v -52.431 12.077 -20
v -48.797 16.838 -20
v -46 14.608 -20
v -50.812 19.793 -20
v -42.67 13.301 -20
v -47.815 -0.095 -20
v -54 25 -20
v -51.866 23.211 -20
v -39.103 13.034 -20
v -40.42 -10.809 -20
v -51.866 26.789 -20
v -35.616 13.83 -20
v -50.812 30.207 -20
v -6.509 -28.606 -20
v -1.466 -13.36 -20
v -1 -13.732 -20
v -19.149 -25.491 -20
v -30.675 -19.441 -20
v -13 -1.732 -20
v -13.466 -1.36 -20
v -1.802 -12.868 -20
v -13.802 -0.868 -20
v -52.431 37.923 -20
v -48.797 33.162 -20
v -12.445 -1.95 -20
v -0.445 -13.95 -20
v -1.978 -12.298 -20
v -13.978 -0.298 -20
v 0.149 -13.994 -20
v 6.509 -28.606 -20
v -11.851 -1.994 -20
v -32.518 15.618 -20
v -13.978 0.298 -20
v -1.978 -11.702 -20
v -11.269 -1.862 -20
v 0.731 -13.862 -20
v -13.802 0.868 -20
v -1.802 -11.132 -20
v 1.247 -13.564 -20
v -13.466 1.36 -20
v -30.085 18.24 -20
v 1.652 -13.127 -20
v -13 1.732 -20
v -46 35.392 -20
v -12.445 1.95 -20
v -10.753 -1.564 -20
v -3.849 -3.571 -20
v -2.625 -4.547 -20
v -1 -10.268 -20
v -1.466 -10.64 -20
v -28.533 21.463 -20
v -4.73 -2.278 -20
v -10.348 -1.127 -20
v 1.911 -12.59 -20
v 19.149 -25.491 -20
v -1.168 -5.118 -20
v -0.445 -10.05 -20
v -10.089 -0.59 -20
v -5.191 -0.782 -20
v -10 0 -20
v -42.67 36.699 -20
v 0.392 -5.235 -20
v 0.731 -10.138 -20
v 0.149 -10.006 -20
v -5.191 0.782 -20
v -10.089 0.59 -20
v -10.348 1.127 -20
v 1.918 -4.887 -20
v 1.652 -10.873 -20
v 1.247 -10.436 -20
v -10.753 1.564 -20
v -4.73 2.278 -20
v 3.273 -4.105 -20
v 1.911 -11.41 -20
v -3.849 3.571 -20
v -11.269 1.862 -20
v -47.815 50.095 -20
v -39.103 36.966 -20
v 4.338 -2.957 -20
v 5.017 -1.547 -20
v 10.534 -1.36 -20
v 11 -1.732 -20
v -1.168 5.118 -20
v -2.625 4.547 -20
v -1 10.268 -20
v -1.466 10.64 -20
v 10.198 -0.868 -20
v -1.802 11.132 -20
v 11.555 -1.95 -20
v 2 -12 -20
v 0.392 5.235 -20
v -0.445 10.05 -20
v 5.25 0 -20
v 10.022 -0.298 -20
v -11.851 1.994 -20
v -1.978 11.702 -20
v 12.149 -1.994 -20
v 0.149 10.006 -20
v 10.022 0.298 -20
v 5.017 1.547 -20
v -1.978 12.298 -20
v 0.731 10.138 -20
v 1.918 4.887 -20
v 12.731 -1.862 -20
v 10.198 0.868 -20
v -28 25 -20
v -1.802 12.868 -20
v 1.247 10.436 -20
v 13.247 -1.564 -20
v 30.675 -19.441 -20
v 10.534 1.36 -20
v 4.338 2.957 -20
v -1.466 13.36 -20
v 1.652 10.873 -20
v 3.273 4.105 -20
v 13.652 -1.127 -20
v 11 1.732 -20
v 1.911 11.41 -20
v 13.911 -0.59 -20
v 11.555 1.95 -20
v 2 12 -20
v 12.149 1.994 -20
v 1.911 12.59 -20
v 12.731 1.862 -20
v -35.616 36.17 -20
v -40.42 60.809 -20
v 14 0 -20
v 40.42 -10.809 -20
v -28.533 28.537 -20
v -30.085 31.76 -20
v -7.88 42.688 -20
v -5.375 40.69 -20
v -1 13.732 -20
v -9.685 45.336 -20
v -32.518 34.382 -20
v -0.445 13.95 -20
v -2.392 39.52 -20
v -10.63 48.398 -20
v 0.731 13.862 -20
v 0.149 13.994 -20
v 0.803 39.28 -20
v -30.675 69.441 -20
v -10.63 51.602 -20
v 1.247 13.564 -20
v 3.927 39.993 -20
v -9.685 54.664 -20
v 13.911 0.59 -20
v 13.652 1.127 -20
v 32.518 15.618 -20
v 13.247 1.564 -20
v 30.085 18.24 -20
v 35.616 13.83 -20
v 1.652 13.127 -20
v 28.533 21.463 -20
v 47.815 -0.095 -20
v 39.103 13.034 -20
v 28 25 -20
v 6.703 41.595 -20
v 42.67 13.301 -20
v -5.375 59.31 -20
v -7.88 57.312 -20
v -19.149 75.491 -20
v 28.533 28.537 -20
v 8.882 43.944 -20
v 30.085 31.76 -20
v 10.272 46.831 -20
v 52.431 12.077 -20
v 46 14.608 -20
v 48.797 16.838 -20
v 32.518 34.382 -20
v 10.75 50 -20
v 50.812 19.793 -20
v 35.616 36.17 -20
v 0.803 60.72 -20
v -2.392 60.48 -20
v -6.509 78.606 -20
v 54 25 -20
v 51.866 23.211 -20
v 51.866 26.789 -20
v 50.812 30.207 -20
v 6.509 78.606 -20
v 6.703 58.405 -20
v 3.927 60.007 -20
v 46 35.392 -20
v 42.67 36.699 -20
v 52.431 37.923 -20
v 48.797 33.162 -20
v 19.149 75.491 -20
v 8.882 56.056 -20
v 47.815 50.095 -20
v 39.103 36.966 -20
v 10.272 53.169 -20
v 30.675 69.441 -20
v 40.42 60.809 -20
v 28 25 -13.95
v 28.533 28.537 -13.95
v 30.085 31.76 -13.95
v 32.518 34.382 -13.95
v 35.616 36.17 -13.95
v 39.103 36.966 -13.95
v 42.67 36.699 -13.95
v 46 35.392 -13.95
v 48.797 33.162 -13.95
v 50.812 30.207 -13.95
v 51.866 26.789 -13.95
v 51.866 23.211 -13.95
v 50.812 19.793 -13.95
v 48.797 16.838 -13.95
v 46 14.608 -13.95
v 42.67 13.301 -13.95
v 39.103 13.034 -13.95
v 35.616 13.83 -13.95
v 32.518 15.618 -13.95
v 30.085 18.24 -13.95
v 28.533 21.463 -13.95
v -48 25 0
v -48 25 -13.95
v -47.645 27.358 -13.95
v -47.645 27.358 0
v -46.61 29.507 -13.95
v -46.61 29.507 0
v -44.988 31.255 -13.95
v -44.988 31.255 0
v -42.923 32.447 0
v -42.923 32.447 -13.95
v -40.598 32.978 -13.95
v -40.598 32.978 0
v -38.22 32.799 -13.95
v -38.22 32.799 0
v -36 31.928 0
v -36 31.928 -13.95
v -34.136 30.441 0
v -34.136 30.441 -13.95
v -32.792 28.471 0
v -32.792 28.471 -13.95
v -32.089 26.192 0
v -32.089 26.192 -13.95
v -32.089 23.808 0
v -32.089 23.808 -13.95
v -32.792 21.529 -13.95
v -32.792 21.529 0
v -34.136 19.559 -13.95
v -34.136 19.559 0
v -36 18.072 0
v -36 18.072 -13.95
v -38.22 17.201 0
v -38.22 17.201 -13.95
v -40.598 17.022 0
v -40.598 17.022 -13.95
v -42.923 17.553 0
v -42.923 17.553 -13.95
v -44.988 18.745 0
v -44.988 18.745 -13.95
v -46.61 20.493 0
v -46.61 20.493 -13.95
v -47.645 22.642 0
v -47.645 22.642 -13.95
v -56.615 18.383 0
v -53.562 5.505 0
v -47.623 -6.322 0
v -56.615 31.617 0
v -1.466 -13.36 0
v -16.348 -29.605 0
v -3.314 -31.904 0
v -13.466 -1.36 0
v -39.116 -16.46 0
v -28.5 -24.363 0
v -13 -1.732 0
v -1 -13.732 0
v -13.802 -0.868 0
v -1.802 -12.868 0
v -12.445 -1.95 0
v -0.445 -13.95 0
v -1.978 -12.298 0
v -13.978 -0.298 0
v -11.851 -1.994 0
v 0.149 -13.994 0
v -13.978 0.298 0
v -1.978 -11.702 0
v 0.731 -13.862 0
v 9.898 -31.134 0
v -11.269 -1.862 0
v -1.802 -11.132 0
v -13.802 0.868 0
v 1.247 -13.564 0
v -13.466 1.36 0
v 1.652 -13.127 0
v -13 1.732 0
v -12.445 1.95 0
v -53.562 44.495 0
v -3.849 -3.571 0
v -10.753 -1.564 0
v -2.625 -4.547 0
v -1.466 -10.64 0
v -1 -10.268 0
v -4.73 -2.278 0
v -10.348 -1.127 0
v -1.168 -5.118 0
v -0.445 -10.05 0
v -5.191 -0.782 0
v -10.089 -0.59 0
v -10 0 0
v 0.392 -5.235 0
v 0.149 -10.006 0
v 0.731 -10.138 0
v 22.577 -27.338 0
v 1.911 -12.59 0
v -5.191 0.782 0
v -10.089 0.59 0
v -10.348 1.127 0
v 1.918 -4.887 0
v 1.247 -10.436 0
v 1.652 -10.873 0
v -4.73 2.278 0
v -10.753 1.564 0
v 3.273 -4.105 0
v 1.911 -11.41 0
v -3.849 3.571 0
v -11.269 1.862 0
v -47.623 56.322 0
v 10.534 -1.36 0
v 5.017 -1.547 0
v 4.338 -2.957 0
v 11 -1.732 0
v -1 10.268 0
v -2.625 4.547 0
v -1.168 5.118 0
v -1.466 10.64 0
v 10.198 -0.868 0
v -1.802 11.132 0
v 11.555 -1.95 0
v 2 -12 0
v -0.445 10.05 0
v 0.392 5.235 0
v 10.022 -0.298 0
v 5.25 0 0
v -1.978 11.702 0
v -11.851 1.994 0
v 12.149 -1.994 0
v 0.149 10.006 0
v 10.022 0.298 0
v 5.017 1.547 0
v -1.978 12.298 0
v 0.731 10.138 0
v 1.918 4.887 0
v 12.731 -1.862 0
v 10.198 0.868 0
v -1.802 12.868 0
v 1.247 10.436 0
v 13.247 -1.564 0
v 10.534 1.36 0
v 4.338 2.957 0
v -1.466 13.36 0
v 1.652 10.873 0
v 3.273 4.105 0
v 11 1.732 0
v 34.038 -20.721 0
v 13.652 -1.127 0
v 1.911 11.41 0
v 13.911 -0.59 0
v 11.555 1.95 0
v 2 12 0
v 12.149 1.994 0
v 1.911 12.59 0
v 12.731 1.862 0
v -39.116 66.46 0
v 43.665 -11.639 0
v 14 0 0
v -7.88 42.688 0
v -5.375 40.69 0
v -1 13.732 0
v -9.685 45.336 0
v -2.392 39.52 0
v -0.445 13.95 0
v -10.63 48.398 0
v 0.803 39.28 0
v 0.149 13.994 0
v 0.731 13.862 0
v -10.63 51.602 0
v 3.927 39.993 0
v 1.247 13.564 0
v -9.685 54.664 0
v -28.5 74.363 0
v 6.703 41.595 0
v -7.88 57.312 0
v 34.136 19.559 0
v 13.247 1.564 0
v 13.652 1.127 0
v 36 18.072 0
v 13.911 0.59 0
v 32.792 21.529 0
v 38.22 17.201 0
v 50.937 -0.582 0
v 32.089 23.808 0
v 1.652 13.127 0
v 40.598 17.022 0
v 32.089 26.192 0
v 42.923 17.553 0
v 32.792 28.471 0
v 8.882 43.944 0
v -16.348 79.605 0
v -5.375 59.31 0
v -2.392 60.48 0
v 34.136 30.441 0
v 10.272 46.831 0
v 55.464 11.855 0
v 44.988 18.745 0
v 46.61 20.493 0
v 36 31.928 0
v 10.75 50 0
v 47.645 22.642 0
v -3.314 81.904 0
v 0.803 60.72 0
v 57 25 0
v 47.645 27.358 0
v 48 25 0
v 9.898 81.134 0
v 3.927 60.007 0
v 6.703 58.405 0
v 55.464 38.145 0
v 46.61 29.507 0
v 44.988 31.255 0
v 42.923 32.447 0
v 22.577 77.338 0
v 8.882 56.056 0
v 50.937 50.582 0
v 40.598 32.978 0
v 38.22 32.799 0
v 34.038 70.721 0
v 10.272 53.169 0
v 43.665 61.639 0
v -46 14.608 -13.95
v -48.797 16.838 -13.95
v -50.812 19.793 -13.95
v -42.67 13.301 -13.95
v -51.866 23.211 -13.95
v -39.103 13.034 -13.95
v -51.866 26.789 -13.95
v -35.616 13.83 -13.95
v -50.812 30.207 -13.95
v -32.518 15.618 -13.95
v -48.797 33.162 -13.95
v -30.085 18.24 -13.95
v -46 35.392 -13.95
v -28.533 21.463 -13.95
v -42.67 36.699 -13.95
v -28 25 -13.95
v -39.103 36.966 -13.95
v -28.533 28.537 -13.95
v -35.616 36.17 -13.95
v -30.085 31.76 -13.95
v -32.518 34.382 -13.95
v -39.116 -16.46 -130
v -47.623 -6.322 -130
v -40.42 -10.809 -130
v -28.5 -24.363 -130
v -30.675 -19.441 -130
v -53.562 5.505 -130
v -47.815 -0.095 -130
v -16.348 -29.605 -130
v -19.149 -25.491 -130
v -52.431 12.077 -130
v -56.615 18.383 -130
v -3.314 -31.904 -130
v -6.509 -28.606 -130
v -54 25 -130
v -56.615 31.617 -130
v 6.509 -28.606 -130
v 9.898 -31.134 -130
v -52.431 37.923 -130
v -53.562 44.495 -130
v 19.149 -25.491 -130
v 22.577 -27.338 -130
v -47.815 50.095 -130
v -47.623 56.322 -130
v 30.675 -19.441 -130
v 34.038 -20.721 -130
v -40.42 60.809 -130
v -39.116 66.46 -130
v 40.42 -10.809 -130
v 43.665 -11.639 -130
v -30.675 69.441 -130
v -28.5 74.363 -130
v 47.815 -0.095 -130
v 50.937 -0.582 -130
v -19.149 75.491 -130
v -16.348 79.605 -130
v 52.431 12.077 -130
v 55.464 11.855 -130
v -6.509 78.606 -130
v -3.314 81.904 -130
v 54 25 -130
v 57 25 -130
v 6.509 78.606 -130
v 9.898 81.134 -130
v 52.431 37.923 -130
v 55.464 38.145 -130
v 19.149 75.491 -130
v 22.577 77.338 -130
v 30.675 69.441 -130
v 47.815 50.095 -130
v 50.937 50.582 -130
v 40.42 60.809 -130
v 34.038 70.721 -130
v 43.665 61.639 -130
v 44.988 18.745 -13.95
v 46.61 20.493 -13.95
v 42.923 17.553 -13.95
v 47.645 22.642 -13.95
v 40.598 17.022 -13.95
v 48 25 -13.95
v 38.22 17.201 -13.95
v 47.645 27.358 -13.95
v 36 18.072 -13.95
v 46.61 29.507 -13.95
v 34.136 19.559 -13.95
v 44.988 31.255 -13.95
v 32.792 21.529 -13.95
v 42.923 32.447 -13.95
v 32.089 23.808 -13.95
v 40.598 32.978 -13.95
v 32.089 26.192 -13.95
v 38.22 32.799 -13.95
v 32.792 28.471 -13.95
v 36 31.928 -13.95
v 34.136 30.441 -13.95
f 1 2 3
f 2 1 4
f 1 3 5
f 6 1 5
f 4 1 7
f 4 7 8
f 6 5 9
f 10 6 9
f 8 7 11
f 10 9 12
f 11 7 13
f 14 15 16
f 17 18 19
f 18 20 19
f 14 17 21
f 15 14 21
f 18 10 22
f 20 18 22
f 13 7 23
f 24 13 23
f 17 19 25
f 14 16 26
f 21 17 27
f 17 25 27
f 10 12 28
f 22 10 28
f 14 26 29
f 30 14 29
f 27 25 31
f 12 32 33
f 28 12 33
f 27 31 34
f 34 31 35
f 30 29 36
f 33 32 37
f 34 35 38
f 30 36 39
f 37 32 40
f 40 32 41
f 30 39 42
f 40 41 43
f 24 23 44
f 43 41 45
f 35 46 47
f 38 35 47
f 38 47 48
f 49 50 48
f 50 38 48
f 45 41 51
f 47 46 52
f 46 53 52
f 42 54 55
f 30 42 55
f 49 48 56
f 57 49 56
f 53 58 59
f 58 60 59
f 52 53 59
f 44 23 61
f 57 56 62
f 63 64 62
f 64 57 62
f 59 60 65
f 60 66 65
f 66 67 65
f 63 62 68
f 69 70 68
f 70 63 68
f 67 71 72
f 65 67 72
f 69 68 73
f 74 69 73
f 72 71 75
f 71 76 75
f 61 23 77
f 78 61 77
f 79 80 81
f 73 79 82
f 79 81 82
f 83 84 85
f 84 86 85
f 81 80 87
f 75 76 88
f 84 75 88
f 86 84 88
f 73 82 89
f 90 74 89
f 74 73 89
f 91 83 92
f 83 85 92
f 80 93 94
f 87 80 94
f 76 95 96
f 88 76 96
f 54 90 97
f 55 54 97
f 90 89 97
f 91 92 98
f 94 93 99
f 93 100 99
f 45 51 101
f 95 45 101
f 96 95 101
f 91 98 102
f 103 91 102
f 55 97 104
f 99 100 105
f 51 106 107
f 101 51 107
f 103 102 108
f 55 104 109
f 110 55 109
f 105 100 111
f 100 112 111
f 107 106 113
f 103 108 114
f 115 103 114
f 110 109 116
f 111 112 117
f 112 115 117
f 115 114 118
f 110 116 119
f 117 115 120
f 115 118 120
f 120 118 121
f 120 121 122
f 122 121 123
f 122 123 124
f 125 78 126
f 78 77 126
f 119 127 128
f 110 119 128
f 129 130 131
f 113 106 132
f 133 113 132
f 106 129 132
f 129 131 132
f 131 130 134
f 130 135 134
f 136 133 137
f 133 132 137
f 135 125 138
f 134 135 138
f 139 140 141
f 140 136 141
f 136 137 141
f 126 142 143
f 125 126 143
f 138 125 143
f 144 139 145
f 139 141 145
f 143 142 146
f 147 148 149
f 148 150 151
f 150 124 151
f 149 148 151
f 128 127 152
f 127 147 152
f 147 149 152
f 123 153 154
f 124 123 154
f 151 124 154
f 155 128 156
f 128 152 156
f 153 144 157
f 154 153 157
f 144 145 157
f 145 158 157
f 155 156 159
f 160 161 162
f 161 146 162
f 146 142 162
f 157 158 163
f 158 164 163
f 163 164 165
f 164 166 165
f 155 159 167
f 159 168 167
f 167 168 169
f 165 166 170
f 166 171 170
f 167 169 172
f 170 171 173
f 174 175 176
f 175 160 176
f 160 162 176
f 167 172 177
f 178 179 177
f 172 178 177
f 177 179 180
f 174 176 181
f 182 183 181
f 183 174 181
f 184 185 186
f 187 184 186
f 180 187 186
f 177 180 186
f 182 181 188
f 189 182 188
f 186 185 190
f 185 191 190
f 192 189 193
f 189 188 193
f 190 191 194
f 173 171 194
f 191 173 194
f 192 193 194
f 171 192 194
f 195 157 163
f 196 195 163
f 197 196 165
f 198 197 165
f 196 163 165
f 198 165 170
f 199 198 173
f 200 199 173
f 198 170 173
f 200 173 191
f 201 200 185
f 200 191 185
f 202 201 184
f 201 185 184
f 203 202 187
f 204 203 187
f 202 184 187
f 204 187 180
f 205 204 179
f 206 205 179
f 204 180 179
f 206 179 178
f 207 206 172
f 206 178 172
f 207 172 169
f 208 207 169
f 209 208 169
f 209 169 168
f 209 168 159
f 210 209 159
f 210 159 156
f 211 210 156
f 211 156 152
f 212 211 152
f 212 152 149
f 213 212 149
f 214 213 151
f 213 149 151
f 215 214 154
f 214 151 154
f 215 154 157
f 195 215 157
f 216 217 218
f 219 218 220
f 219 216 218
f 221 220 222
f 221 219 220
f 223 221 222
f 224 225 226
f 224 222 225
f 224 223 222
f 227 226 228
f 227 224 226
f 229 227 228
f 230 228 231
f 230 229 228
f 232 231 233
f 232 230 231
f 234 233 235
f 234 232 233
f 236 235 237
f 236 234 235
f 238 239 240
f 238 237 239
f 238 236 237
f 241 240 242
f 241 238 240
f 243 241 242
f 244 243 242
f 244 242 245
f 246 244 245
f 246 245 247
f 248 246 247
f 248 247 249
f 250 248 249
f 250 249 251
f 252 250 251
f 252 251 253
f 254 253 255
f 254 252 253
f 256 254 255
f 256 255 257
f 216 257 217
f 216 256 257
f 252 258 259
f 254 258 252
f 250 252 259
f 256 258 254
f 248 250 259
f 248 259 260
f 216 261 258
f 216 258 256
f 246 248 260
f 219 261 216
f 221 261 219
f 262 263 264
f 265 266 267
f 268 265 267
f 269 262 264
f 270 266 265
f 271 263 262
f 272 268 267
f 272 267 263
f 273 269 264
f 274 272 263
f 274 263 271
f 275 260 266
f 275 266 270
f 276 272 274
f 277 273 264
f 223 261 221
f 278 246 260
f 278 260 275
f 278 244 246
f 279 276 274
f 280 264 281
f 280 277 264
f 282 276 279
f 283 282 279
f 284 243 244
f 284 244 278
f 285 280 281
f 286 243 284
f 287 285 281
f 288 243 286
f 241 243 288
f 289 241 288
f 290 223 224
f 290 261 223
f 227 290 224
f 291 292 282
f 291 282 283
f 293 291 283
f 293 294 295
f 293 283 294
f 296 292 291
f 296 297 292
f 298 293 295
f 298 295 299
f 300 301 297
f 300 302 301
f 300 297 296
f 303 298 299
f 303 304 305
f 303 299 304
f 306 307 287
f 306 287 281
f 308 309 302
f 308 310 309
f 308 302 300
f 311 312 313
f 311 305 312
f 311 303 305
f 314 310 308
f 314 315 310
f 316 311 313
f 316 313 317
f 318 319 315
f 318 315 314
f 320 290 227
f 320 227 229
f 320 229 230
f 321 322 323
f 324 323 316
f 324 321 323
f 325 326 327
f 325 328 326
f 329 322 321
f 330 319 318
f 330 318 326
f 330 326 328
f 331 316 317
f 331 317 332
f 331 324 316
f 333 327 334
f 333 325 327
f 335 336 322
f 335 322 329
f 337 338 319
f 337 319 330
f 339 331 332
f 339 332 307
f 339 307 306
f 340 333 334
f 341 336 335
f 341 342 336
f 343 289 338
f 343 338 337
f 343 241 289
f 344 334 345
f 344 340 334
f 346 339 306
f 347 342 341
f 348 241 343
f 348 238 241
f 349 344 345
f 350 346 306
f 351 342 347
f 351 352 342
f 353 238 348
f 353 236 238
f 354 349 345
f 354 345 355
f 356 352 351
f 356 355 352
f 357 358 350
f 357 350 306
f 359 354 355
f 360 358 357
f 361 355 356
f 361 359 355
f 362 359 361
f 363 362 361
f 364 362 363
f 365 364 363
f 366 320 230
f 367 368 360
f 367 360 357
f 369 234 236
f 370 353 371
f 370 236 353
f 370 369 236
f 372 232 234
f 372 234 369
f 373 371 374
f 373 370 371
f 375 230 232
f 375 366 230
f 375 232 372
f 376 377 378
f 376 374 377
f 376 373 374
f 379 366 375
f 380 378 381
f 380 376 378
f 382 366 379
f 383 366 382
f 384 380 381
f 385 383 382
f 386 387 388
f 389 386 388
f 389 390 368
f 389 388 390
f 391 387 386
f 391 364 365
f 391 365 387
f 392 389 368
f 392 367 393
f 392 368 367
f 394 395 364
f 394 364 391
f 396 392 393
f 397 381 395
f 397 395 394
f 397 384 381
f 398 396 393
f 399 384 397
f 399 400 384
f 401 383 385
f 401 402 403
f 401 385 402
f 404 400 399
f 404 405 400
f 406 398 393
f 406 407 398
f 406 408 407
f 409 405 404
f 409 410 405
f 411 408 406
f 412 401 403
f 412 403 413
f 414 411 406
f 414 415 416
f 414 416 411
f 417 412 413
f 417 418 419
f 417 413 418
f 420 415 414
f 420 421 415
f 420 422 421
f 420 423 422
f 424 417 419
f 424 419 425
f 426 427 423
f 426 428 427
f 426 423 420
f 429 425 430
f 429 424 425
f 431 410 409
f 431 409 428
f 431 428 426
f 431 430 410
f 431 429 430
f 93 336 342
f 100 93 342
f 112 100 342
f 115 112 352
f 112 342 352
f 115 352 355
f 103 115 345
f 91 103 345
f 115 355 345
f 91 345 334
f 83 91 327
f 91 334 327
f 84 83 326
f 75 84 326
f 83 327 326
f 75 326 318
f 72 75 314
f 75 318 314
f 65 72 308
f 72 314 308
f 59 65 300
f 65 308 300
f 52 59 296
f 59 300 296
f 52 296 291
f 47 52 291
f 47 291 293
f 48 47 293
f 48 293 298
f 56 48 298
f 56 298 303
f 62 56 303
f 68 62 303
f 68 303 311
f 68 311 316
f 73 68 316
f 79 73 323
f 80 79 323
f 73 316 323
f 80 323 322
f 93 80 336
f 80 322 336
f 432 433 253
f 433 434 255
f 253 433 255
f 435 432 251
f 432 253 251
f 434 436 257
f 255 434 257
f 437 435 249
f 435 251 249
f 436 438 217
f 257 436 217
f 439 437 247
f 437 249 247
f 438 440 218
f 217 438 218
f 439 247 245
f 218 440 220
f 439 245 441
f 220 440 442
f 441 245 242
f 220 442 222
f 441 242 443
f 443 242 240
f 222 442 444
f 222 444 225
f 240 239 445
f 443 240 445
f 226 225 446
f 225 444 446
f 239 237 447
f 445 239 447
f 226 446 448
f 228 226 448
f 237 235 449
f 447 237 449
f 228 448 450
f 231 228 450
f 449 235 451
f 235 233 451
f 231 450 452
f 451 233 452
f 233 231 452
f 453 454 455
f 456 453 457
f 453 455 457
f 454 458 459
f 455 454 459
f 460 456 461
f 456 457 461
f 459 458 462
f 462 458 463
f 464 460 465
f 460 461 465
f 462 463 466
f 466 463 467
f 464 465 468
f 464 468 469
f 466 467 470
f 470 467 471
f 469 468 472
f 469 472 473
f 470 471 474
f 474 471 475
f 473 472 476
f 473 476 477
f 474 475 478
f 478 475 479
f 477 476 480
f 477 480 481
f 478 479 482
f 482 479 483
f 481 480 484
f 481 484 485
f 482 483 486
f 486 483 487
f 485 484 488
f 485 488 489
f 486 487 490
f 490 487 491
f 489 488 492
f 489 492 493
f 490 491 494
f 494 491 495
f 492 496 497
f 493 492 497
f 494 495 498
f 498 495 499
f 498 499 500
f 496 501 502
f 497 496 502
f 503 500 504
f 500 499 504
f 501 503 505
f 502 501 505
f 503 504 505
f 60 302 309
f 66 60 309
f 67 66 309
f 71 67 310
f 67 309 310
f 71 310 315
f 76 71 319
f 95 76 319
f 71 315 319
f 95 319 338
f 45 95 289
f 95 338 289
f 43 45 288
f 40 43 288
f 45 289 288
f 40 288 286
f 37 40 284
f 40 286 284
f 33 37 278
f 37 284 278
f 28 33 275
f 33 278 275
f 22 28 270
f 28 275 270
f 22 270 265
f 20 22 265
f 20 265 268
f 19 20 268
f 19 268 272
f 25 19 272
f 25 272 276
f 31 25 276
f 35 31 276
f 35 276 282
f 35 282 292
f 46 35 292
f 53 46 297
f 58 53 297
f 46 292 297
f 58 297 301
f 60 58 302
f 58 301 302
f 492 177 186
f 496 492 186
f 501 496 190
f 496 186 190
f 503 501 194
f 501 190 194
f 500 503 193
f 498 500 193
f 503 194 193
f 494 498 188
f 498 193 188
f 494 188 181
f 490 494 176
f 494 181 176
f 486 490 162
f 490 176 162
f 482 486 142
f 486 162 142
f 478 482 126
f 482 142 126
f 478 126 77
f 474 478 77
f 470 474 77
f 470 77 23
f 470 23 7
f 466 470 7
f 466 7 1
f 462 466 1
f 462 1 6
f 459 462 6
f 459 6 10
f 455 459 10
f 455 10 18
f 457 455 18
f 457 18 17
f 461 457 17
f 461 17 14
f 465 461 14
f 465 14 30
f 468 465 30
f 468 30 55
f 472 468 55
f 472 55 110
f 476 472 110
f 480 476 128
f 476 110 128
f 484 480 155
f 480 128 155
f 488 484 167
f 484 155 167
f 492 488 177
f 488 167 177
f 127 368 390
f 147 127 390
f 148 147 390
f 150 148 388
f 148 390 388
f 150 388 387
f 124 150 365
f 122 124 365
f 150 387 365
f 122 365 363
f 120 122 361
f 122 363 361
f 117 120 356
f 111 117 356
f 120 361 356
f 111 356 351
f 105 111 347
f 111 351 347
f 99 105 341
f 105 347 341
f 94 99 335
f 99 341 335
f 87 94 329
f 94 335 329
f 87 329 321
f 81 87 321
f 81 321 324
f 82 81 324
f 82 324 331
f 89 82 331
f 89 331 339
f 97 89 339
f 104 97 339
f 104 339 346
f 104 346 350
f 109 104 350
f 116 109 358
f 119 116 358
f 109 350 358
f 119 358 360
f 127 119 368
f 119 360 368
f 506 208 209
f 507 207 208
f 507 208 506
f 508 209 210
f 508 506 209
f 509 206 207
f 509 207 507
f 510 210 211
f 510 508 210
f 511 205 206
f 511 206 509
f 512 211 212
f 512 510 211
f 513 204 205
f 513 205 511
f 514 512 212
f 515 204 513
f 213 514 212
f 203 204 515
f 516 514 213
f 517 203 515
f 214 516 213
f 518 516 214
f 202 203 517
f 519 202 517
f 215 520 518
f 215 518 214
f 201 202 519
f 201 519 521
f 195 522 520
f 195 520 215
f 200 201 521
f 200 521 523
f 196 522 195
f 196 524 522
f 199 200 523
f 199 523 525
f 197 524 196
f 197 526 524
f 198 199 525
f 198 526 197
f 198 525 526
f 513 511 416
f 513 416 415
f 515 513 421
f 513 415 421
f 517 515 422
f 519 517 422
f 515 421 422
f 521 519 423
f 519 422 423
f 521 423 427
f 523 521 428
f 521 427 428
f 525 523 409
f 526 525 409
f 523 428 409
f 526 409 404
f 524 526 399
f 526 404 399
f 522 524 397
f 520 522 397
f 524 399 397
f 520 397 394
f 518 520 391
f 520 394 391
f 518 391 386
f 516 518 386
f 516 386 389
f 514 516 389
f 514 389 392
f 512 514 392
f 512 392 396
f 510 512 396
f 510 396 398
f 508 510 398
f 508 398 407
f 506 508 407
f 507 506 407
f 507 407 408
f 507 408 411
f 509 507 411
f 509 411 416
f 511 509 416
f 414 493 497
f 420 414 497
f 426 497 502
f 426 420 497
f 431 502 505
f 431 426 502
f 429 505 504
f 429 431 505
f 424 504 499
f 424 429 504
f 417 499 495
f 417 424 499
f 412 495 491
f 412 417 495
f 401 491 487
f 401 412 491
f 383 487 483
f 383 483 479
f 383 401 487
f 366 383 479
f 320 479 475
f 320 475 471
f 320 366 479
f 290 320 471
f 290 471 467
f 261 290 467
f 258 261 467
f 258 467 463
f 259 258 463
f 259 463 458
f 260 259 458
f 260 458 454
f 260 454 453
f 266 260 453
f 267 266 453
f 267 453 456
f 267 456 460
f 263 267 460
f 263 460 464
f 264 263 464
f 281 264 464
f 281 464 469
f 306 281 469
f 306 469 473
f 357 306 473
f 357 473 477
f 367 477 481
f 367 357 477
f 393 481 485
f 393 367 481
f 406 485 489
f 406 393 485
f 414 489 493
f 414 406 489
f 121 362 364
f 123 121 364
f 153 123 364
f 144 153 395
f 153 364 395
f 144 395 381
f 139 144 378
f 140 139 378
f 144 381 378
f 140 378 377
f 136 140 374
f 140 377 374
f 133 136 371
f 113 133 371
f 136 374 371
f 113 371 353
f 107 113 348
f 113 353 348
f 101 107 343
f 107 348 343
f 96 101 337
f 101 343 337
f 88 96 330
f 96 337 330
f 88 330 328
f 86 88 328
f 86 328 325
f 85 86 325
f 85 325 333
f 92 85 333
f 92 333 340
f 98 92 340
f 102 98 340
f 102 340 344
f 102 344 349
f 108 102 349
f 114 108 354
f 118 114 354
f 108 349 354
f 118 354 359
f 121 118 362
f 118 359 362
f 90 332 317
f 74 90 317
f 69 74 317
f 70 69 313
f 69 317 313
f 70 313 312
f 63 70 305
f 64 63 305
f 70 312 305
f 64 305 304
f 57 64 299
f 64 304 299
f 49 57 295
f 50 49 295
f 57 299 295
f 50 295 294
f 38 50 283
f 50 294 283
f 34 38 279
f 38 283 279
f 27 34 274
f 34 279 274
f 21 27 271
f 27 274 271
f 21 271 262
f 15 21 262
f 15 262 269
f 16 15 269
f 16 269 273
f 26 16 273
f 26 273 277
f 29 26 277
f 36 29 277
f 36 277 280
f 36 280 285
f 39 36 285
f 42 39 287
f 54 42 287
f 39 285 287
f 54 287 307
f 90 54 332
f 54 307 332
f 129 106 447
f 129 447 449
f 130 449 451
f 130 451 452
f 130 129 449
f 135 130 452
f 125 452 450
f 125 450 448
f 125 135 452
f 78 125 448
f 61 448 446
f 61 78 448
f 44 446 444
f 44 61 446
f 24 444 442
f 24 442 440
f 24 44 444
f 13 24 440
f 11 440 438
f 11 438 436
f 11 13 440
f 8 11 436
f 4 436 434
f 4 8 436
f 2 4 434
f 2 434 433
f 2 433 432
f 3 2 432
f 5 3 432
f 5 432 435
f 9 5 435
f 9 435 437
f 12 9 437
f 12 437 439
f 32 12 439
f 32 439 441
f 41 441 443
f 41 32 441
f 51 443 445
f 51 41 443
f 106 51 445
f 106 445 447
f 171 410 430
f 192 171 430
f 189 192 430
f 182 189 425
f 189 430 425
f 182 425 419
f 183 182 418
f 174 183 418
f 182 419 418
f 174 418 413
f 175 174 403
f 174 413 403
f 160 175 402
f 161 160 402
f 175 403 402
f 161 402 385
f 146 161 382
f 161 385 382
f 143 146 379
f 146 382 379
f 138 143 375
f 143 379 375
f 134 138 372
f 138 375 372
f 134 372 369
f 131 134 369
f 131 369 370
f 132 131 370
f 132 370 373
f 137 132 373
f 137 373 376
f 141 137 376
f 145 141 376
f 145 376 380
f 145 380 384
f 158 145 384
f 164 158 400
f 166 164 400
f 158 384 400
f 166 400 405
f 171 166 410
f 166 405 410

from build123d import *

# Parameters (mm, degrees)
SKETCH1_R           = 57
SKETCH1_R_2         = 2
SKETCH1_R_3         = 5.25
SKETCH1_R_4         = 10.75
BOSS_EXTRUDE1_DEPTH = 20
SKETCH2_R           = 57
SKETCH2_R_2         = 54
BOSS_EXTRUDE2_DEPTH = 130
SKETCH3_R           = 8
CUT_EXTRUDE1_DEPTH  = 19.5
SKETCH5_R           = 12
CUT_EXTRUDE3_DEPTH  = 6.05


with BuildPart() as part:
    # Sketch1 → Boss-Extrude1 (new body)
    with BuildSketch(Plane.XY):
        with Locations((0, 25)):
            Circle(SKETCH1_R)
        with Locations((12, 0)):
            Circle(SKETCH1_R_2, mode=Mode.SUBTRACT)
        with Locations((0, -12)):
            Circle(SKETCH1_R_2, mode=Mode.SUBTRACT)
        with Locations((-12, 0)):
            Circle(SKETCH1_R_2, mode=Mode.SUBTRACT)
        Circle(SKETCH1_R_3, mode=Mode.SUBTRACT)
        with Locations((0, 12)):
            Circle(SKETCH1_R_2, mode=Mode.SUBTRACT)
        with Locations((0, 50)):
            Circle(SKETCH1_R_4, mode=Mode.SUBTRACT)
    extrude(amount=-BOSS_EXTRUDE1_DEPTH)

    # Sketch2 → Boss-Extrude2 (add)
    with BuildSketch(Plane.XY):
        with Locations((0, 25)):
            Circle(SKETCH2_R)
        with Locations((0, 25)):
            Circle(SKETCH2_R_2, mode=Mode.SUBTRACT)
    extrude(amount=-BOSS_EXTRUDE2_DEPTH)

    # Sketch3 → Cut-Extrude1 (cut)
    with BuildSketch(Plane.XY):
        with Locations((40, 25)):
            Circle(SKETCH3_R)
    cut_extrude1 = extrude(amount=-CUT_EXTRUDE1_DEPTH, mode=Mode.SUBTRACT)

    # Sketch5 → Cut-Extrude3 (cut)
    with BuildSketch(Plane(origin=(0, 0, -20), x_dir=(-1, 0, 0), z_dir=(0, 0, -1))):
        with Locations((-40, 25)):
            Circle(SKETCH5_R)
    cut_extrude3 = extrude(amount=-CUT_EXTRUDE3_DEPTH, mode=Mode.SUBTRACT)

    # Mirror1: Cut-Extrude1, Cut-Extrude3 across plane
    add(cut_extrude1.mirror(Plane(origin=(0, 0, 0), x_dir=(0, 0, 1), z_dir=(1, 0, 0))), mode=Mode.SUBTRACT)
    add(cut_extrude3.mirror(Plane(origin=(0, 0, 0), x_dir=(0, 0, 1), z_dir=(1, 0, 0))), mode=Mode.SUBTRACT)


solid = part.part
